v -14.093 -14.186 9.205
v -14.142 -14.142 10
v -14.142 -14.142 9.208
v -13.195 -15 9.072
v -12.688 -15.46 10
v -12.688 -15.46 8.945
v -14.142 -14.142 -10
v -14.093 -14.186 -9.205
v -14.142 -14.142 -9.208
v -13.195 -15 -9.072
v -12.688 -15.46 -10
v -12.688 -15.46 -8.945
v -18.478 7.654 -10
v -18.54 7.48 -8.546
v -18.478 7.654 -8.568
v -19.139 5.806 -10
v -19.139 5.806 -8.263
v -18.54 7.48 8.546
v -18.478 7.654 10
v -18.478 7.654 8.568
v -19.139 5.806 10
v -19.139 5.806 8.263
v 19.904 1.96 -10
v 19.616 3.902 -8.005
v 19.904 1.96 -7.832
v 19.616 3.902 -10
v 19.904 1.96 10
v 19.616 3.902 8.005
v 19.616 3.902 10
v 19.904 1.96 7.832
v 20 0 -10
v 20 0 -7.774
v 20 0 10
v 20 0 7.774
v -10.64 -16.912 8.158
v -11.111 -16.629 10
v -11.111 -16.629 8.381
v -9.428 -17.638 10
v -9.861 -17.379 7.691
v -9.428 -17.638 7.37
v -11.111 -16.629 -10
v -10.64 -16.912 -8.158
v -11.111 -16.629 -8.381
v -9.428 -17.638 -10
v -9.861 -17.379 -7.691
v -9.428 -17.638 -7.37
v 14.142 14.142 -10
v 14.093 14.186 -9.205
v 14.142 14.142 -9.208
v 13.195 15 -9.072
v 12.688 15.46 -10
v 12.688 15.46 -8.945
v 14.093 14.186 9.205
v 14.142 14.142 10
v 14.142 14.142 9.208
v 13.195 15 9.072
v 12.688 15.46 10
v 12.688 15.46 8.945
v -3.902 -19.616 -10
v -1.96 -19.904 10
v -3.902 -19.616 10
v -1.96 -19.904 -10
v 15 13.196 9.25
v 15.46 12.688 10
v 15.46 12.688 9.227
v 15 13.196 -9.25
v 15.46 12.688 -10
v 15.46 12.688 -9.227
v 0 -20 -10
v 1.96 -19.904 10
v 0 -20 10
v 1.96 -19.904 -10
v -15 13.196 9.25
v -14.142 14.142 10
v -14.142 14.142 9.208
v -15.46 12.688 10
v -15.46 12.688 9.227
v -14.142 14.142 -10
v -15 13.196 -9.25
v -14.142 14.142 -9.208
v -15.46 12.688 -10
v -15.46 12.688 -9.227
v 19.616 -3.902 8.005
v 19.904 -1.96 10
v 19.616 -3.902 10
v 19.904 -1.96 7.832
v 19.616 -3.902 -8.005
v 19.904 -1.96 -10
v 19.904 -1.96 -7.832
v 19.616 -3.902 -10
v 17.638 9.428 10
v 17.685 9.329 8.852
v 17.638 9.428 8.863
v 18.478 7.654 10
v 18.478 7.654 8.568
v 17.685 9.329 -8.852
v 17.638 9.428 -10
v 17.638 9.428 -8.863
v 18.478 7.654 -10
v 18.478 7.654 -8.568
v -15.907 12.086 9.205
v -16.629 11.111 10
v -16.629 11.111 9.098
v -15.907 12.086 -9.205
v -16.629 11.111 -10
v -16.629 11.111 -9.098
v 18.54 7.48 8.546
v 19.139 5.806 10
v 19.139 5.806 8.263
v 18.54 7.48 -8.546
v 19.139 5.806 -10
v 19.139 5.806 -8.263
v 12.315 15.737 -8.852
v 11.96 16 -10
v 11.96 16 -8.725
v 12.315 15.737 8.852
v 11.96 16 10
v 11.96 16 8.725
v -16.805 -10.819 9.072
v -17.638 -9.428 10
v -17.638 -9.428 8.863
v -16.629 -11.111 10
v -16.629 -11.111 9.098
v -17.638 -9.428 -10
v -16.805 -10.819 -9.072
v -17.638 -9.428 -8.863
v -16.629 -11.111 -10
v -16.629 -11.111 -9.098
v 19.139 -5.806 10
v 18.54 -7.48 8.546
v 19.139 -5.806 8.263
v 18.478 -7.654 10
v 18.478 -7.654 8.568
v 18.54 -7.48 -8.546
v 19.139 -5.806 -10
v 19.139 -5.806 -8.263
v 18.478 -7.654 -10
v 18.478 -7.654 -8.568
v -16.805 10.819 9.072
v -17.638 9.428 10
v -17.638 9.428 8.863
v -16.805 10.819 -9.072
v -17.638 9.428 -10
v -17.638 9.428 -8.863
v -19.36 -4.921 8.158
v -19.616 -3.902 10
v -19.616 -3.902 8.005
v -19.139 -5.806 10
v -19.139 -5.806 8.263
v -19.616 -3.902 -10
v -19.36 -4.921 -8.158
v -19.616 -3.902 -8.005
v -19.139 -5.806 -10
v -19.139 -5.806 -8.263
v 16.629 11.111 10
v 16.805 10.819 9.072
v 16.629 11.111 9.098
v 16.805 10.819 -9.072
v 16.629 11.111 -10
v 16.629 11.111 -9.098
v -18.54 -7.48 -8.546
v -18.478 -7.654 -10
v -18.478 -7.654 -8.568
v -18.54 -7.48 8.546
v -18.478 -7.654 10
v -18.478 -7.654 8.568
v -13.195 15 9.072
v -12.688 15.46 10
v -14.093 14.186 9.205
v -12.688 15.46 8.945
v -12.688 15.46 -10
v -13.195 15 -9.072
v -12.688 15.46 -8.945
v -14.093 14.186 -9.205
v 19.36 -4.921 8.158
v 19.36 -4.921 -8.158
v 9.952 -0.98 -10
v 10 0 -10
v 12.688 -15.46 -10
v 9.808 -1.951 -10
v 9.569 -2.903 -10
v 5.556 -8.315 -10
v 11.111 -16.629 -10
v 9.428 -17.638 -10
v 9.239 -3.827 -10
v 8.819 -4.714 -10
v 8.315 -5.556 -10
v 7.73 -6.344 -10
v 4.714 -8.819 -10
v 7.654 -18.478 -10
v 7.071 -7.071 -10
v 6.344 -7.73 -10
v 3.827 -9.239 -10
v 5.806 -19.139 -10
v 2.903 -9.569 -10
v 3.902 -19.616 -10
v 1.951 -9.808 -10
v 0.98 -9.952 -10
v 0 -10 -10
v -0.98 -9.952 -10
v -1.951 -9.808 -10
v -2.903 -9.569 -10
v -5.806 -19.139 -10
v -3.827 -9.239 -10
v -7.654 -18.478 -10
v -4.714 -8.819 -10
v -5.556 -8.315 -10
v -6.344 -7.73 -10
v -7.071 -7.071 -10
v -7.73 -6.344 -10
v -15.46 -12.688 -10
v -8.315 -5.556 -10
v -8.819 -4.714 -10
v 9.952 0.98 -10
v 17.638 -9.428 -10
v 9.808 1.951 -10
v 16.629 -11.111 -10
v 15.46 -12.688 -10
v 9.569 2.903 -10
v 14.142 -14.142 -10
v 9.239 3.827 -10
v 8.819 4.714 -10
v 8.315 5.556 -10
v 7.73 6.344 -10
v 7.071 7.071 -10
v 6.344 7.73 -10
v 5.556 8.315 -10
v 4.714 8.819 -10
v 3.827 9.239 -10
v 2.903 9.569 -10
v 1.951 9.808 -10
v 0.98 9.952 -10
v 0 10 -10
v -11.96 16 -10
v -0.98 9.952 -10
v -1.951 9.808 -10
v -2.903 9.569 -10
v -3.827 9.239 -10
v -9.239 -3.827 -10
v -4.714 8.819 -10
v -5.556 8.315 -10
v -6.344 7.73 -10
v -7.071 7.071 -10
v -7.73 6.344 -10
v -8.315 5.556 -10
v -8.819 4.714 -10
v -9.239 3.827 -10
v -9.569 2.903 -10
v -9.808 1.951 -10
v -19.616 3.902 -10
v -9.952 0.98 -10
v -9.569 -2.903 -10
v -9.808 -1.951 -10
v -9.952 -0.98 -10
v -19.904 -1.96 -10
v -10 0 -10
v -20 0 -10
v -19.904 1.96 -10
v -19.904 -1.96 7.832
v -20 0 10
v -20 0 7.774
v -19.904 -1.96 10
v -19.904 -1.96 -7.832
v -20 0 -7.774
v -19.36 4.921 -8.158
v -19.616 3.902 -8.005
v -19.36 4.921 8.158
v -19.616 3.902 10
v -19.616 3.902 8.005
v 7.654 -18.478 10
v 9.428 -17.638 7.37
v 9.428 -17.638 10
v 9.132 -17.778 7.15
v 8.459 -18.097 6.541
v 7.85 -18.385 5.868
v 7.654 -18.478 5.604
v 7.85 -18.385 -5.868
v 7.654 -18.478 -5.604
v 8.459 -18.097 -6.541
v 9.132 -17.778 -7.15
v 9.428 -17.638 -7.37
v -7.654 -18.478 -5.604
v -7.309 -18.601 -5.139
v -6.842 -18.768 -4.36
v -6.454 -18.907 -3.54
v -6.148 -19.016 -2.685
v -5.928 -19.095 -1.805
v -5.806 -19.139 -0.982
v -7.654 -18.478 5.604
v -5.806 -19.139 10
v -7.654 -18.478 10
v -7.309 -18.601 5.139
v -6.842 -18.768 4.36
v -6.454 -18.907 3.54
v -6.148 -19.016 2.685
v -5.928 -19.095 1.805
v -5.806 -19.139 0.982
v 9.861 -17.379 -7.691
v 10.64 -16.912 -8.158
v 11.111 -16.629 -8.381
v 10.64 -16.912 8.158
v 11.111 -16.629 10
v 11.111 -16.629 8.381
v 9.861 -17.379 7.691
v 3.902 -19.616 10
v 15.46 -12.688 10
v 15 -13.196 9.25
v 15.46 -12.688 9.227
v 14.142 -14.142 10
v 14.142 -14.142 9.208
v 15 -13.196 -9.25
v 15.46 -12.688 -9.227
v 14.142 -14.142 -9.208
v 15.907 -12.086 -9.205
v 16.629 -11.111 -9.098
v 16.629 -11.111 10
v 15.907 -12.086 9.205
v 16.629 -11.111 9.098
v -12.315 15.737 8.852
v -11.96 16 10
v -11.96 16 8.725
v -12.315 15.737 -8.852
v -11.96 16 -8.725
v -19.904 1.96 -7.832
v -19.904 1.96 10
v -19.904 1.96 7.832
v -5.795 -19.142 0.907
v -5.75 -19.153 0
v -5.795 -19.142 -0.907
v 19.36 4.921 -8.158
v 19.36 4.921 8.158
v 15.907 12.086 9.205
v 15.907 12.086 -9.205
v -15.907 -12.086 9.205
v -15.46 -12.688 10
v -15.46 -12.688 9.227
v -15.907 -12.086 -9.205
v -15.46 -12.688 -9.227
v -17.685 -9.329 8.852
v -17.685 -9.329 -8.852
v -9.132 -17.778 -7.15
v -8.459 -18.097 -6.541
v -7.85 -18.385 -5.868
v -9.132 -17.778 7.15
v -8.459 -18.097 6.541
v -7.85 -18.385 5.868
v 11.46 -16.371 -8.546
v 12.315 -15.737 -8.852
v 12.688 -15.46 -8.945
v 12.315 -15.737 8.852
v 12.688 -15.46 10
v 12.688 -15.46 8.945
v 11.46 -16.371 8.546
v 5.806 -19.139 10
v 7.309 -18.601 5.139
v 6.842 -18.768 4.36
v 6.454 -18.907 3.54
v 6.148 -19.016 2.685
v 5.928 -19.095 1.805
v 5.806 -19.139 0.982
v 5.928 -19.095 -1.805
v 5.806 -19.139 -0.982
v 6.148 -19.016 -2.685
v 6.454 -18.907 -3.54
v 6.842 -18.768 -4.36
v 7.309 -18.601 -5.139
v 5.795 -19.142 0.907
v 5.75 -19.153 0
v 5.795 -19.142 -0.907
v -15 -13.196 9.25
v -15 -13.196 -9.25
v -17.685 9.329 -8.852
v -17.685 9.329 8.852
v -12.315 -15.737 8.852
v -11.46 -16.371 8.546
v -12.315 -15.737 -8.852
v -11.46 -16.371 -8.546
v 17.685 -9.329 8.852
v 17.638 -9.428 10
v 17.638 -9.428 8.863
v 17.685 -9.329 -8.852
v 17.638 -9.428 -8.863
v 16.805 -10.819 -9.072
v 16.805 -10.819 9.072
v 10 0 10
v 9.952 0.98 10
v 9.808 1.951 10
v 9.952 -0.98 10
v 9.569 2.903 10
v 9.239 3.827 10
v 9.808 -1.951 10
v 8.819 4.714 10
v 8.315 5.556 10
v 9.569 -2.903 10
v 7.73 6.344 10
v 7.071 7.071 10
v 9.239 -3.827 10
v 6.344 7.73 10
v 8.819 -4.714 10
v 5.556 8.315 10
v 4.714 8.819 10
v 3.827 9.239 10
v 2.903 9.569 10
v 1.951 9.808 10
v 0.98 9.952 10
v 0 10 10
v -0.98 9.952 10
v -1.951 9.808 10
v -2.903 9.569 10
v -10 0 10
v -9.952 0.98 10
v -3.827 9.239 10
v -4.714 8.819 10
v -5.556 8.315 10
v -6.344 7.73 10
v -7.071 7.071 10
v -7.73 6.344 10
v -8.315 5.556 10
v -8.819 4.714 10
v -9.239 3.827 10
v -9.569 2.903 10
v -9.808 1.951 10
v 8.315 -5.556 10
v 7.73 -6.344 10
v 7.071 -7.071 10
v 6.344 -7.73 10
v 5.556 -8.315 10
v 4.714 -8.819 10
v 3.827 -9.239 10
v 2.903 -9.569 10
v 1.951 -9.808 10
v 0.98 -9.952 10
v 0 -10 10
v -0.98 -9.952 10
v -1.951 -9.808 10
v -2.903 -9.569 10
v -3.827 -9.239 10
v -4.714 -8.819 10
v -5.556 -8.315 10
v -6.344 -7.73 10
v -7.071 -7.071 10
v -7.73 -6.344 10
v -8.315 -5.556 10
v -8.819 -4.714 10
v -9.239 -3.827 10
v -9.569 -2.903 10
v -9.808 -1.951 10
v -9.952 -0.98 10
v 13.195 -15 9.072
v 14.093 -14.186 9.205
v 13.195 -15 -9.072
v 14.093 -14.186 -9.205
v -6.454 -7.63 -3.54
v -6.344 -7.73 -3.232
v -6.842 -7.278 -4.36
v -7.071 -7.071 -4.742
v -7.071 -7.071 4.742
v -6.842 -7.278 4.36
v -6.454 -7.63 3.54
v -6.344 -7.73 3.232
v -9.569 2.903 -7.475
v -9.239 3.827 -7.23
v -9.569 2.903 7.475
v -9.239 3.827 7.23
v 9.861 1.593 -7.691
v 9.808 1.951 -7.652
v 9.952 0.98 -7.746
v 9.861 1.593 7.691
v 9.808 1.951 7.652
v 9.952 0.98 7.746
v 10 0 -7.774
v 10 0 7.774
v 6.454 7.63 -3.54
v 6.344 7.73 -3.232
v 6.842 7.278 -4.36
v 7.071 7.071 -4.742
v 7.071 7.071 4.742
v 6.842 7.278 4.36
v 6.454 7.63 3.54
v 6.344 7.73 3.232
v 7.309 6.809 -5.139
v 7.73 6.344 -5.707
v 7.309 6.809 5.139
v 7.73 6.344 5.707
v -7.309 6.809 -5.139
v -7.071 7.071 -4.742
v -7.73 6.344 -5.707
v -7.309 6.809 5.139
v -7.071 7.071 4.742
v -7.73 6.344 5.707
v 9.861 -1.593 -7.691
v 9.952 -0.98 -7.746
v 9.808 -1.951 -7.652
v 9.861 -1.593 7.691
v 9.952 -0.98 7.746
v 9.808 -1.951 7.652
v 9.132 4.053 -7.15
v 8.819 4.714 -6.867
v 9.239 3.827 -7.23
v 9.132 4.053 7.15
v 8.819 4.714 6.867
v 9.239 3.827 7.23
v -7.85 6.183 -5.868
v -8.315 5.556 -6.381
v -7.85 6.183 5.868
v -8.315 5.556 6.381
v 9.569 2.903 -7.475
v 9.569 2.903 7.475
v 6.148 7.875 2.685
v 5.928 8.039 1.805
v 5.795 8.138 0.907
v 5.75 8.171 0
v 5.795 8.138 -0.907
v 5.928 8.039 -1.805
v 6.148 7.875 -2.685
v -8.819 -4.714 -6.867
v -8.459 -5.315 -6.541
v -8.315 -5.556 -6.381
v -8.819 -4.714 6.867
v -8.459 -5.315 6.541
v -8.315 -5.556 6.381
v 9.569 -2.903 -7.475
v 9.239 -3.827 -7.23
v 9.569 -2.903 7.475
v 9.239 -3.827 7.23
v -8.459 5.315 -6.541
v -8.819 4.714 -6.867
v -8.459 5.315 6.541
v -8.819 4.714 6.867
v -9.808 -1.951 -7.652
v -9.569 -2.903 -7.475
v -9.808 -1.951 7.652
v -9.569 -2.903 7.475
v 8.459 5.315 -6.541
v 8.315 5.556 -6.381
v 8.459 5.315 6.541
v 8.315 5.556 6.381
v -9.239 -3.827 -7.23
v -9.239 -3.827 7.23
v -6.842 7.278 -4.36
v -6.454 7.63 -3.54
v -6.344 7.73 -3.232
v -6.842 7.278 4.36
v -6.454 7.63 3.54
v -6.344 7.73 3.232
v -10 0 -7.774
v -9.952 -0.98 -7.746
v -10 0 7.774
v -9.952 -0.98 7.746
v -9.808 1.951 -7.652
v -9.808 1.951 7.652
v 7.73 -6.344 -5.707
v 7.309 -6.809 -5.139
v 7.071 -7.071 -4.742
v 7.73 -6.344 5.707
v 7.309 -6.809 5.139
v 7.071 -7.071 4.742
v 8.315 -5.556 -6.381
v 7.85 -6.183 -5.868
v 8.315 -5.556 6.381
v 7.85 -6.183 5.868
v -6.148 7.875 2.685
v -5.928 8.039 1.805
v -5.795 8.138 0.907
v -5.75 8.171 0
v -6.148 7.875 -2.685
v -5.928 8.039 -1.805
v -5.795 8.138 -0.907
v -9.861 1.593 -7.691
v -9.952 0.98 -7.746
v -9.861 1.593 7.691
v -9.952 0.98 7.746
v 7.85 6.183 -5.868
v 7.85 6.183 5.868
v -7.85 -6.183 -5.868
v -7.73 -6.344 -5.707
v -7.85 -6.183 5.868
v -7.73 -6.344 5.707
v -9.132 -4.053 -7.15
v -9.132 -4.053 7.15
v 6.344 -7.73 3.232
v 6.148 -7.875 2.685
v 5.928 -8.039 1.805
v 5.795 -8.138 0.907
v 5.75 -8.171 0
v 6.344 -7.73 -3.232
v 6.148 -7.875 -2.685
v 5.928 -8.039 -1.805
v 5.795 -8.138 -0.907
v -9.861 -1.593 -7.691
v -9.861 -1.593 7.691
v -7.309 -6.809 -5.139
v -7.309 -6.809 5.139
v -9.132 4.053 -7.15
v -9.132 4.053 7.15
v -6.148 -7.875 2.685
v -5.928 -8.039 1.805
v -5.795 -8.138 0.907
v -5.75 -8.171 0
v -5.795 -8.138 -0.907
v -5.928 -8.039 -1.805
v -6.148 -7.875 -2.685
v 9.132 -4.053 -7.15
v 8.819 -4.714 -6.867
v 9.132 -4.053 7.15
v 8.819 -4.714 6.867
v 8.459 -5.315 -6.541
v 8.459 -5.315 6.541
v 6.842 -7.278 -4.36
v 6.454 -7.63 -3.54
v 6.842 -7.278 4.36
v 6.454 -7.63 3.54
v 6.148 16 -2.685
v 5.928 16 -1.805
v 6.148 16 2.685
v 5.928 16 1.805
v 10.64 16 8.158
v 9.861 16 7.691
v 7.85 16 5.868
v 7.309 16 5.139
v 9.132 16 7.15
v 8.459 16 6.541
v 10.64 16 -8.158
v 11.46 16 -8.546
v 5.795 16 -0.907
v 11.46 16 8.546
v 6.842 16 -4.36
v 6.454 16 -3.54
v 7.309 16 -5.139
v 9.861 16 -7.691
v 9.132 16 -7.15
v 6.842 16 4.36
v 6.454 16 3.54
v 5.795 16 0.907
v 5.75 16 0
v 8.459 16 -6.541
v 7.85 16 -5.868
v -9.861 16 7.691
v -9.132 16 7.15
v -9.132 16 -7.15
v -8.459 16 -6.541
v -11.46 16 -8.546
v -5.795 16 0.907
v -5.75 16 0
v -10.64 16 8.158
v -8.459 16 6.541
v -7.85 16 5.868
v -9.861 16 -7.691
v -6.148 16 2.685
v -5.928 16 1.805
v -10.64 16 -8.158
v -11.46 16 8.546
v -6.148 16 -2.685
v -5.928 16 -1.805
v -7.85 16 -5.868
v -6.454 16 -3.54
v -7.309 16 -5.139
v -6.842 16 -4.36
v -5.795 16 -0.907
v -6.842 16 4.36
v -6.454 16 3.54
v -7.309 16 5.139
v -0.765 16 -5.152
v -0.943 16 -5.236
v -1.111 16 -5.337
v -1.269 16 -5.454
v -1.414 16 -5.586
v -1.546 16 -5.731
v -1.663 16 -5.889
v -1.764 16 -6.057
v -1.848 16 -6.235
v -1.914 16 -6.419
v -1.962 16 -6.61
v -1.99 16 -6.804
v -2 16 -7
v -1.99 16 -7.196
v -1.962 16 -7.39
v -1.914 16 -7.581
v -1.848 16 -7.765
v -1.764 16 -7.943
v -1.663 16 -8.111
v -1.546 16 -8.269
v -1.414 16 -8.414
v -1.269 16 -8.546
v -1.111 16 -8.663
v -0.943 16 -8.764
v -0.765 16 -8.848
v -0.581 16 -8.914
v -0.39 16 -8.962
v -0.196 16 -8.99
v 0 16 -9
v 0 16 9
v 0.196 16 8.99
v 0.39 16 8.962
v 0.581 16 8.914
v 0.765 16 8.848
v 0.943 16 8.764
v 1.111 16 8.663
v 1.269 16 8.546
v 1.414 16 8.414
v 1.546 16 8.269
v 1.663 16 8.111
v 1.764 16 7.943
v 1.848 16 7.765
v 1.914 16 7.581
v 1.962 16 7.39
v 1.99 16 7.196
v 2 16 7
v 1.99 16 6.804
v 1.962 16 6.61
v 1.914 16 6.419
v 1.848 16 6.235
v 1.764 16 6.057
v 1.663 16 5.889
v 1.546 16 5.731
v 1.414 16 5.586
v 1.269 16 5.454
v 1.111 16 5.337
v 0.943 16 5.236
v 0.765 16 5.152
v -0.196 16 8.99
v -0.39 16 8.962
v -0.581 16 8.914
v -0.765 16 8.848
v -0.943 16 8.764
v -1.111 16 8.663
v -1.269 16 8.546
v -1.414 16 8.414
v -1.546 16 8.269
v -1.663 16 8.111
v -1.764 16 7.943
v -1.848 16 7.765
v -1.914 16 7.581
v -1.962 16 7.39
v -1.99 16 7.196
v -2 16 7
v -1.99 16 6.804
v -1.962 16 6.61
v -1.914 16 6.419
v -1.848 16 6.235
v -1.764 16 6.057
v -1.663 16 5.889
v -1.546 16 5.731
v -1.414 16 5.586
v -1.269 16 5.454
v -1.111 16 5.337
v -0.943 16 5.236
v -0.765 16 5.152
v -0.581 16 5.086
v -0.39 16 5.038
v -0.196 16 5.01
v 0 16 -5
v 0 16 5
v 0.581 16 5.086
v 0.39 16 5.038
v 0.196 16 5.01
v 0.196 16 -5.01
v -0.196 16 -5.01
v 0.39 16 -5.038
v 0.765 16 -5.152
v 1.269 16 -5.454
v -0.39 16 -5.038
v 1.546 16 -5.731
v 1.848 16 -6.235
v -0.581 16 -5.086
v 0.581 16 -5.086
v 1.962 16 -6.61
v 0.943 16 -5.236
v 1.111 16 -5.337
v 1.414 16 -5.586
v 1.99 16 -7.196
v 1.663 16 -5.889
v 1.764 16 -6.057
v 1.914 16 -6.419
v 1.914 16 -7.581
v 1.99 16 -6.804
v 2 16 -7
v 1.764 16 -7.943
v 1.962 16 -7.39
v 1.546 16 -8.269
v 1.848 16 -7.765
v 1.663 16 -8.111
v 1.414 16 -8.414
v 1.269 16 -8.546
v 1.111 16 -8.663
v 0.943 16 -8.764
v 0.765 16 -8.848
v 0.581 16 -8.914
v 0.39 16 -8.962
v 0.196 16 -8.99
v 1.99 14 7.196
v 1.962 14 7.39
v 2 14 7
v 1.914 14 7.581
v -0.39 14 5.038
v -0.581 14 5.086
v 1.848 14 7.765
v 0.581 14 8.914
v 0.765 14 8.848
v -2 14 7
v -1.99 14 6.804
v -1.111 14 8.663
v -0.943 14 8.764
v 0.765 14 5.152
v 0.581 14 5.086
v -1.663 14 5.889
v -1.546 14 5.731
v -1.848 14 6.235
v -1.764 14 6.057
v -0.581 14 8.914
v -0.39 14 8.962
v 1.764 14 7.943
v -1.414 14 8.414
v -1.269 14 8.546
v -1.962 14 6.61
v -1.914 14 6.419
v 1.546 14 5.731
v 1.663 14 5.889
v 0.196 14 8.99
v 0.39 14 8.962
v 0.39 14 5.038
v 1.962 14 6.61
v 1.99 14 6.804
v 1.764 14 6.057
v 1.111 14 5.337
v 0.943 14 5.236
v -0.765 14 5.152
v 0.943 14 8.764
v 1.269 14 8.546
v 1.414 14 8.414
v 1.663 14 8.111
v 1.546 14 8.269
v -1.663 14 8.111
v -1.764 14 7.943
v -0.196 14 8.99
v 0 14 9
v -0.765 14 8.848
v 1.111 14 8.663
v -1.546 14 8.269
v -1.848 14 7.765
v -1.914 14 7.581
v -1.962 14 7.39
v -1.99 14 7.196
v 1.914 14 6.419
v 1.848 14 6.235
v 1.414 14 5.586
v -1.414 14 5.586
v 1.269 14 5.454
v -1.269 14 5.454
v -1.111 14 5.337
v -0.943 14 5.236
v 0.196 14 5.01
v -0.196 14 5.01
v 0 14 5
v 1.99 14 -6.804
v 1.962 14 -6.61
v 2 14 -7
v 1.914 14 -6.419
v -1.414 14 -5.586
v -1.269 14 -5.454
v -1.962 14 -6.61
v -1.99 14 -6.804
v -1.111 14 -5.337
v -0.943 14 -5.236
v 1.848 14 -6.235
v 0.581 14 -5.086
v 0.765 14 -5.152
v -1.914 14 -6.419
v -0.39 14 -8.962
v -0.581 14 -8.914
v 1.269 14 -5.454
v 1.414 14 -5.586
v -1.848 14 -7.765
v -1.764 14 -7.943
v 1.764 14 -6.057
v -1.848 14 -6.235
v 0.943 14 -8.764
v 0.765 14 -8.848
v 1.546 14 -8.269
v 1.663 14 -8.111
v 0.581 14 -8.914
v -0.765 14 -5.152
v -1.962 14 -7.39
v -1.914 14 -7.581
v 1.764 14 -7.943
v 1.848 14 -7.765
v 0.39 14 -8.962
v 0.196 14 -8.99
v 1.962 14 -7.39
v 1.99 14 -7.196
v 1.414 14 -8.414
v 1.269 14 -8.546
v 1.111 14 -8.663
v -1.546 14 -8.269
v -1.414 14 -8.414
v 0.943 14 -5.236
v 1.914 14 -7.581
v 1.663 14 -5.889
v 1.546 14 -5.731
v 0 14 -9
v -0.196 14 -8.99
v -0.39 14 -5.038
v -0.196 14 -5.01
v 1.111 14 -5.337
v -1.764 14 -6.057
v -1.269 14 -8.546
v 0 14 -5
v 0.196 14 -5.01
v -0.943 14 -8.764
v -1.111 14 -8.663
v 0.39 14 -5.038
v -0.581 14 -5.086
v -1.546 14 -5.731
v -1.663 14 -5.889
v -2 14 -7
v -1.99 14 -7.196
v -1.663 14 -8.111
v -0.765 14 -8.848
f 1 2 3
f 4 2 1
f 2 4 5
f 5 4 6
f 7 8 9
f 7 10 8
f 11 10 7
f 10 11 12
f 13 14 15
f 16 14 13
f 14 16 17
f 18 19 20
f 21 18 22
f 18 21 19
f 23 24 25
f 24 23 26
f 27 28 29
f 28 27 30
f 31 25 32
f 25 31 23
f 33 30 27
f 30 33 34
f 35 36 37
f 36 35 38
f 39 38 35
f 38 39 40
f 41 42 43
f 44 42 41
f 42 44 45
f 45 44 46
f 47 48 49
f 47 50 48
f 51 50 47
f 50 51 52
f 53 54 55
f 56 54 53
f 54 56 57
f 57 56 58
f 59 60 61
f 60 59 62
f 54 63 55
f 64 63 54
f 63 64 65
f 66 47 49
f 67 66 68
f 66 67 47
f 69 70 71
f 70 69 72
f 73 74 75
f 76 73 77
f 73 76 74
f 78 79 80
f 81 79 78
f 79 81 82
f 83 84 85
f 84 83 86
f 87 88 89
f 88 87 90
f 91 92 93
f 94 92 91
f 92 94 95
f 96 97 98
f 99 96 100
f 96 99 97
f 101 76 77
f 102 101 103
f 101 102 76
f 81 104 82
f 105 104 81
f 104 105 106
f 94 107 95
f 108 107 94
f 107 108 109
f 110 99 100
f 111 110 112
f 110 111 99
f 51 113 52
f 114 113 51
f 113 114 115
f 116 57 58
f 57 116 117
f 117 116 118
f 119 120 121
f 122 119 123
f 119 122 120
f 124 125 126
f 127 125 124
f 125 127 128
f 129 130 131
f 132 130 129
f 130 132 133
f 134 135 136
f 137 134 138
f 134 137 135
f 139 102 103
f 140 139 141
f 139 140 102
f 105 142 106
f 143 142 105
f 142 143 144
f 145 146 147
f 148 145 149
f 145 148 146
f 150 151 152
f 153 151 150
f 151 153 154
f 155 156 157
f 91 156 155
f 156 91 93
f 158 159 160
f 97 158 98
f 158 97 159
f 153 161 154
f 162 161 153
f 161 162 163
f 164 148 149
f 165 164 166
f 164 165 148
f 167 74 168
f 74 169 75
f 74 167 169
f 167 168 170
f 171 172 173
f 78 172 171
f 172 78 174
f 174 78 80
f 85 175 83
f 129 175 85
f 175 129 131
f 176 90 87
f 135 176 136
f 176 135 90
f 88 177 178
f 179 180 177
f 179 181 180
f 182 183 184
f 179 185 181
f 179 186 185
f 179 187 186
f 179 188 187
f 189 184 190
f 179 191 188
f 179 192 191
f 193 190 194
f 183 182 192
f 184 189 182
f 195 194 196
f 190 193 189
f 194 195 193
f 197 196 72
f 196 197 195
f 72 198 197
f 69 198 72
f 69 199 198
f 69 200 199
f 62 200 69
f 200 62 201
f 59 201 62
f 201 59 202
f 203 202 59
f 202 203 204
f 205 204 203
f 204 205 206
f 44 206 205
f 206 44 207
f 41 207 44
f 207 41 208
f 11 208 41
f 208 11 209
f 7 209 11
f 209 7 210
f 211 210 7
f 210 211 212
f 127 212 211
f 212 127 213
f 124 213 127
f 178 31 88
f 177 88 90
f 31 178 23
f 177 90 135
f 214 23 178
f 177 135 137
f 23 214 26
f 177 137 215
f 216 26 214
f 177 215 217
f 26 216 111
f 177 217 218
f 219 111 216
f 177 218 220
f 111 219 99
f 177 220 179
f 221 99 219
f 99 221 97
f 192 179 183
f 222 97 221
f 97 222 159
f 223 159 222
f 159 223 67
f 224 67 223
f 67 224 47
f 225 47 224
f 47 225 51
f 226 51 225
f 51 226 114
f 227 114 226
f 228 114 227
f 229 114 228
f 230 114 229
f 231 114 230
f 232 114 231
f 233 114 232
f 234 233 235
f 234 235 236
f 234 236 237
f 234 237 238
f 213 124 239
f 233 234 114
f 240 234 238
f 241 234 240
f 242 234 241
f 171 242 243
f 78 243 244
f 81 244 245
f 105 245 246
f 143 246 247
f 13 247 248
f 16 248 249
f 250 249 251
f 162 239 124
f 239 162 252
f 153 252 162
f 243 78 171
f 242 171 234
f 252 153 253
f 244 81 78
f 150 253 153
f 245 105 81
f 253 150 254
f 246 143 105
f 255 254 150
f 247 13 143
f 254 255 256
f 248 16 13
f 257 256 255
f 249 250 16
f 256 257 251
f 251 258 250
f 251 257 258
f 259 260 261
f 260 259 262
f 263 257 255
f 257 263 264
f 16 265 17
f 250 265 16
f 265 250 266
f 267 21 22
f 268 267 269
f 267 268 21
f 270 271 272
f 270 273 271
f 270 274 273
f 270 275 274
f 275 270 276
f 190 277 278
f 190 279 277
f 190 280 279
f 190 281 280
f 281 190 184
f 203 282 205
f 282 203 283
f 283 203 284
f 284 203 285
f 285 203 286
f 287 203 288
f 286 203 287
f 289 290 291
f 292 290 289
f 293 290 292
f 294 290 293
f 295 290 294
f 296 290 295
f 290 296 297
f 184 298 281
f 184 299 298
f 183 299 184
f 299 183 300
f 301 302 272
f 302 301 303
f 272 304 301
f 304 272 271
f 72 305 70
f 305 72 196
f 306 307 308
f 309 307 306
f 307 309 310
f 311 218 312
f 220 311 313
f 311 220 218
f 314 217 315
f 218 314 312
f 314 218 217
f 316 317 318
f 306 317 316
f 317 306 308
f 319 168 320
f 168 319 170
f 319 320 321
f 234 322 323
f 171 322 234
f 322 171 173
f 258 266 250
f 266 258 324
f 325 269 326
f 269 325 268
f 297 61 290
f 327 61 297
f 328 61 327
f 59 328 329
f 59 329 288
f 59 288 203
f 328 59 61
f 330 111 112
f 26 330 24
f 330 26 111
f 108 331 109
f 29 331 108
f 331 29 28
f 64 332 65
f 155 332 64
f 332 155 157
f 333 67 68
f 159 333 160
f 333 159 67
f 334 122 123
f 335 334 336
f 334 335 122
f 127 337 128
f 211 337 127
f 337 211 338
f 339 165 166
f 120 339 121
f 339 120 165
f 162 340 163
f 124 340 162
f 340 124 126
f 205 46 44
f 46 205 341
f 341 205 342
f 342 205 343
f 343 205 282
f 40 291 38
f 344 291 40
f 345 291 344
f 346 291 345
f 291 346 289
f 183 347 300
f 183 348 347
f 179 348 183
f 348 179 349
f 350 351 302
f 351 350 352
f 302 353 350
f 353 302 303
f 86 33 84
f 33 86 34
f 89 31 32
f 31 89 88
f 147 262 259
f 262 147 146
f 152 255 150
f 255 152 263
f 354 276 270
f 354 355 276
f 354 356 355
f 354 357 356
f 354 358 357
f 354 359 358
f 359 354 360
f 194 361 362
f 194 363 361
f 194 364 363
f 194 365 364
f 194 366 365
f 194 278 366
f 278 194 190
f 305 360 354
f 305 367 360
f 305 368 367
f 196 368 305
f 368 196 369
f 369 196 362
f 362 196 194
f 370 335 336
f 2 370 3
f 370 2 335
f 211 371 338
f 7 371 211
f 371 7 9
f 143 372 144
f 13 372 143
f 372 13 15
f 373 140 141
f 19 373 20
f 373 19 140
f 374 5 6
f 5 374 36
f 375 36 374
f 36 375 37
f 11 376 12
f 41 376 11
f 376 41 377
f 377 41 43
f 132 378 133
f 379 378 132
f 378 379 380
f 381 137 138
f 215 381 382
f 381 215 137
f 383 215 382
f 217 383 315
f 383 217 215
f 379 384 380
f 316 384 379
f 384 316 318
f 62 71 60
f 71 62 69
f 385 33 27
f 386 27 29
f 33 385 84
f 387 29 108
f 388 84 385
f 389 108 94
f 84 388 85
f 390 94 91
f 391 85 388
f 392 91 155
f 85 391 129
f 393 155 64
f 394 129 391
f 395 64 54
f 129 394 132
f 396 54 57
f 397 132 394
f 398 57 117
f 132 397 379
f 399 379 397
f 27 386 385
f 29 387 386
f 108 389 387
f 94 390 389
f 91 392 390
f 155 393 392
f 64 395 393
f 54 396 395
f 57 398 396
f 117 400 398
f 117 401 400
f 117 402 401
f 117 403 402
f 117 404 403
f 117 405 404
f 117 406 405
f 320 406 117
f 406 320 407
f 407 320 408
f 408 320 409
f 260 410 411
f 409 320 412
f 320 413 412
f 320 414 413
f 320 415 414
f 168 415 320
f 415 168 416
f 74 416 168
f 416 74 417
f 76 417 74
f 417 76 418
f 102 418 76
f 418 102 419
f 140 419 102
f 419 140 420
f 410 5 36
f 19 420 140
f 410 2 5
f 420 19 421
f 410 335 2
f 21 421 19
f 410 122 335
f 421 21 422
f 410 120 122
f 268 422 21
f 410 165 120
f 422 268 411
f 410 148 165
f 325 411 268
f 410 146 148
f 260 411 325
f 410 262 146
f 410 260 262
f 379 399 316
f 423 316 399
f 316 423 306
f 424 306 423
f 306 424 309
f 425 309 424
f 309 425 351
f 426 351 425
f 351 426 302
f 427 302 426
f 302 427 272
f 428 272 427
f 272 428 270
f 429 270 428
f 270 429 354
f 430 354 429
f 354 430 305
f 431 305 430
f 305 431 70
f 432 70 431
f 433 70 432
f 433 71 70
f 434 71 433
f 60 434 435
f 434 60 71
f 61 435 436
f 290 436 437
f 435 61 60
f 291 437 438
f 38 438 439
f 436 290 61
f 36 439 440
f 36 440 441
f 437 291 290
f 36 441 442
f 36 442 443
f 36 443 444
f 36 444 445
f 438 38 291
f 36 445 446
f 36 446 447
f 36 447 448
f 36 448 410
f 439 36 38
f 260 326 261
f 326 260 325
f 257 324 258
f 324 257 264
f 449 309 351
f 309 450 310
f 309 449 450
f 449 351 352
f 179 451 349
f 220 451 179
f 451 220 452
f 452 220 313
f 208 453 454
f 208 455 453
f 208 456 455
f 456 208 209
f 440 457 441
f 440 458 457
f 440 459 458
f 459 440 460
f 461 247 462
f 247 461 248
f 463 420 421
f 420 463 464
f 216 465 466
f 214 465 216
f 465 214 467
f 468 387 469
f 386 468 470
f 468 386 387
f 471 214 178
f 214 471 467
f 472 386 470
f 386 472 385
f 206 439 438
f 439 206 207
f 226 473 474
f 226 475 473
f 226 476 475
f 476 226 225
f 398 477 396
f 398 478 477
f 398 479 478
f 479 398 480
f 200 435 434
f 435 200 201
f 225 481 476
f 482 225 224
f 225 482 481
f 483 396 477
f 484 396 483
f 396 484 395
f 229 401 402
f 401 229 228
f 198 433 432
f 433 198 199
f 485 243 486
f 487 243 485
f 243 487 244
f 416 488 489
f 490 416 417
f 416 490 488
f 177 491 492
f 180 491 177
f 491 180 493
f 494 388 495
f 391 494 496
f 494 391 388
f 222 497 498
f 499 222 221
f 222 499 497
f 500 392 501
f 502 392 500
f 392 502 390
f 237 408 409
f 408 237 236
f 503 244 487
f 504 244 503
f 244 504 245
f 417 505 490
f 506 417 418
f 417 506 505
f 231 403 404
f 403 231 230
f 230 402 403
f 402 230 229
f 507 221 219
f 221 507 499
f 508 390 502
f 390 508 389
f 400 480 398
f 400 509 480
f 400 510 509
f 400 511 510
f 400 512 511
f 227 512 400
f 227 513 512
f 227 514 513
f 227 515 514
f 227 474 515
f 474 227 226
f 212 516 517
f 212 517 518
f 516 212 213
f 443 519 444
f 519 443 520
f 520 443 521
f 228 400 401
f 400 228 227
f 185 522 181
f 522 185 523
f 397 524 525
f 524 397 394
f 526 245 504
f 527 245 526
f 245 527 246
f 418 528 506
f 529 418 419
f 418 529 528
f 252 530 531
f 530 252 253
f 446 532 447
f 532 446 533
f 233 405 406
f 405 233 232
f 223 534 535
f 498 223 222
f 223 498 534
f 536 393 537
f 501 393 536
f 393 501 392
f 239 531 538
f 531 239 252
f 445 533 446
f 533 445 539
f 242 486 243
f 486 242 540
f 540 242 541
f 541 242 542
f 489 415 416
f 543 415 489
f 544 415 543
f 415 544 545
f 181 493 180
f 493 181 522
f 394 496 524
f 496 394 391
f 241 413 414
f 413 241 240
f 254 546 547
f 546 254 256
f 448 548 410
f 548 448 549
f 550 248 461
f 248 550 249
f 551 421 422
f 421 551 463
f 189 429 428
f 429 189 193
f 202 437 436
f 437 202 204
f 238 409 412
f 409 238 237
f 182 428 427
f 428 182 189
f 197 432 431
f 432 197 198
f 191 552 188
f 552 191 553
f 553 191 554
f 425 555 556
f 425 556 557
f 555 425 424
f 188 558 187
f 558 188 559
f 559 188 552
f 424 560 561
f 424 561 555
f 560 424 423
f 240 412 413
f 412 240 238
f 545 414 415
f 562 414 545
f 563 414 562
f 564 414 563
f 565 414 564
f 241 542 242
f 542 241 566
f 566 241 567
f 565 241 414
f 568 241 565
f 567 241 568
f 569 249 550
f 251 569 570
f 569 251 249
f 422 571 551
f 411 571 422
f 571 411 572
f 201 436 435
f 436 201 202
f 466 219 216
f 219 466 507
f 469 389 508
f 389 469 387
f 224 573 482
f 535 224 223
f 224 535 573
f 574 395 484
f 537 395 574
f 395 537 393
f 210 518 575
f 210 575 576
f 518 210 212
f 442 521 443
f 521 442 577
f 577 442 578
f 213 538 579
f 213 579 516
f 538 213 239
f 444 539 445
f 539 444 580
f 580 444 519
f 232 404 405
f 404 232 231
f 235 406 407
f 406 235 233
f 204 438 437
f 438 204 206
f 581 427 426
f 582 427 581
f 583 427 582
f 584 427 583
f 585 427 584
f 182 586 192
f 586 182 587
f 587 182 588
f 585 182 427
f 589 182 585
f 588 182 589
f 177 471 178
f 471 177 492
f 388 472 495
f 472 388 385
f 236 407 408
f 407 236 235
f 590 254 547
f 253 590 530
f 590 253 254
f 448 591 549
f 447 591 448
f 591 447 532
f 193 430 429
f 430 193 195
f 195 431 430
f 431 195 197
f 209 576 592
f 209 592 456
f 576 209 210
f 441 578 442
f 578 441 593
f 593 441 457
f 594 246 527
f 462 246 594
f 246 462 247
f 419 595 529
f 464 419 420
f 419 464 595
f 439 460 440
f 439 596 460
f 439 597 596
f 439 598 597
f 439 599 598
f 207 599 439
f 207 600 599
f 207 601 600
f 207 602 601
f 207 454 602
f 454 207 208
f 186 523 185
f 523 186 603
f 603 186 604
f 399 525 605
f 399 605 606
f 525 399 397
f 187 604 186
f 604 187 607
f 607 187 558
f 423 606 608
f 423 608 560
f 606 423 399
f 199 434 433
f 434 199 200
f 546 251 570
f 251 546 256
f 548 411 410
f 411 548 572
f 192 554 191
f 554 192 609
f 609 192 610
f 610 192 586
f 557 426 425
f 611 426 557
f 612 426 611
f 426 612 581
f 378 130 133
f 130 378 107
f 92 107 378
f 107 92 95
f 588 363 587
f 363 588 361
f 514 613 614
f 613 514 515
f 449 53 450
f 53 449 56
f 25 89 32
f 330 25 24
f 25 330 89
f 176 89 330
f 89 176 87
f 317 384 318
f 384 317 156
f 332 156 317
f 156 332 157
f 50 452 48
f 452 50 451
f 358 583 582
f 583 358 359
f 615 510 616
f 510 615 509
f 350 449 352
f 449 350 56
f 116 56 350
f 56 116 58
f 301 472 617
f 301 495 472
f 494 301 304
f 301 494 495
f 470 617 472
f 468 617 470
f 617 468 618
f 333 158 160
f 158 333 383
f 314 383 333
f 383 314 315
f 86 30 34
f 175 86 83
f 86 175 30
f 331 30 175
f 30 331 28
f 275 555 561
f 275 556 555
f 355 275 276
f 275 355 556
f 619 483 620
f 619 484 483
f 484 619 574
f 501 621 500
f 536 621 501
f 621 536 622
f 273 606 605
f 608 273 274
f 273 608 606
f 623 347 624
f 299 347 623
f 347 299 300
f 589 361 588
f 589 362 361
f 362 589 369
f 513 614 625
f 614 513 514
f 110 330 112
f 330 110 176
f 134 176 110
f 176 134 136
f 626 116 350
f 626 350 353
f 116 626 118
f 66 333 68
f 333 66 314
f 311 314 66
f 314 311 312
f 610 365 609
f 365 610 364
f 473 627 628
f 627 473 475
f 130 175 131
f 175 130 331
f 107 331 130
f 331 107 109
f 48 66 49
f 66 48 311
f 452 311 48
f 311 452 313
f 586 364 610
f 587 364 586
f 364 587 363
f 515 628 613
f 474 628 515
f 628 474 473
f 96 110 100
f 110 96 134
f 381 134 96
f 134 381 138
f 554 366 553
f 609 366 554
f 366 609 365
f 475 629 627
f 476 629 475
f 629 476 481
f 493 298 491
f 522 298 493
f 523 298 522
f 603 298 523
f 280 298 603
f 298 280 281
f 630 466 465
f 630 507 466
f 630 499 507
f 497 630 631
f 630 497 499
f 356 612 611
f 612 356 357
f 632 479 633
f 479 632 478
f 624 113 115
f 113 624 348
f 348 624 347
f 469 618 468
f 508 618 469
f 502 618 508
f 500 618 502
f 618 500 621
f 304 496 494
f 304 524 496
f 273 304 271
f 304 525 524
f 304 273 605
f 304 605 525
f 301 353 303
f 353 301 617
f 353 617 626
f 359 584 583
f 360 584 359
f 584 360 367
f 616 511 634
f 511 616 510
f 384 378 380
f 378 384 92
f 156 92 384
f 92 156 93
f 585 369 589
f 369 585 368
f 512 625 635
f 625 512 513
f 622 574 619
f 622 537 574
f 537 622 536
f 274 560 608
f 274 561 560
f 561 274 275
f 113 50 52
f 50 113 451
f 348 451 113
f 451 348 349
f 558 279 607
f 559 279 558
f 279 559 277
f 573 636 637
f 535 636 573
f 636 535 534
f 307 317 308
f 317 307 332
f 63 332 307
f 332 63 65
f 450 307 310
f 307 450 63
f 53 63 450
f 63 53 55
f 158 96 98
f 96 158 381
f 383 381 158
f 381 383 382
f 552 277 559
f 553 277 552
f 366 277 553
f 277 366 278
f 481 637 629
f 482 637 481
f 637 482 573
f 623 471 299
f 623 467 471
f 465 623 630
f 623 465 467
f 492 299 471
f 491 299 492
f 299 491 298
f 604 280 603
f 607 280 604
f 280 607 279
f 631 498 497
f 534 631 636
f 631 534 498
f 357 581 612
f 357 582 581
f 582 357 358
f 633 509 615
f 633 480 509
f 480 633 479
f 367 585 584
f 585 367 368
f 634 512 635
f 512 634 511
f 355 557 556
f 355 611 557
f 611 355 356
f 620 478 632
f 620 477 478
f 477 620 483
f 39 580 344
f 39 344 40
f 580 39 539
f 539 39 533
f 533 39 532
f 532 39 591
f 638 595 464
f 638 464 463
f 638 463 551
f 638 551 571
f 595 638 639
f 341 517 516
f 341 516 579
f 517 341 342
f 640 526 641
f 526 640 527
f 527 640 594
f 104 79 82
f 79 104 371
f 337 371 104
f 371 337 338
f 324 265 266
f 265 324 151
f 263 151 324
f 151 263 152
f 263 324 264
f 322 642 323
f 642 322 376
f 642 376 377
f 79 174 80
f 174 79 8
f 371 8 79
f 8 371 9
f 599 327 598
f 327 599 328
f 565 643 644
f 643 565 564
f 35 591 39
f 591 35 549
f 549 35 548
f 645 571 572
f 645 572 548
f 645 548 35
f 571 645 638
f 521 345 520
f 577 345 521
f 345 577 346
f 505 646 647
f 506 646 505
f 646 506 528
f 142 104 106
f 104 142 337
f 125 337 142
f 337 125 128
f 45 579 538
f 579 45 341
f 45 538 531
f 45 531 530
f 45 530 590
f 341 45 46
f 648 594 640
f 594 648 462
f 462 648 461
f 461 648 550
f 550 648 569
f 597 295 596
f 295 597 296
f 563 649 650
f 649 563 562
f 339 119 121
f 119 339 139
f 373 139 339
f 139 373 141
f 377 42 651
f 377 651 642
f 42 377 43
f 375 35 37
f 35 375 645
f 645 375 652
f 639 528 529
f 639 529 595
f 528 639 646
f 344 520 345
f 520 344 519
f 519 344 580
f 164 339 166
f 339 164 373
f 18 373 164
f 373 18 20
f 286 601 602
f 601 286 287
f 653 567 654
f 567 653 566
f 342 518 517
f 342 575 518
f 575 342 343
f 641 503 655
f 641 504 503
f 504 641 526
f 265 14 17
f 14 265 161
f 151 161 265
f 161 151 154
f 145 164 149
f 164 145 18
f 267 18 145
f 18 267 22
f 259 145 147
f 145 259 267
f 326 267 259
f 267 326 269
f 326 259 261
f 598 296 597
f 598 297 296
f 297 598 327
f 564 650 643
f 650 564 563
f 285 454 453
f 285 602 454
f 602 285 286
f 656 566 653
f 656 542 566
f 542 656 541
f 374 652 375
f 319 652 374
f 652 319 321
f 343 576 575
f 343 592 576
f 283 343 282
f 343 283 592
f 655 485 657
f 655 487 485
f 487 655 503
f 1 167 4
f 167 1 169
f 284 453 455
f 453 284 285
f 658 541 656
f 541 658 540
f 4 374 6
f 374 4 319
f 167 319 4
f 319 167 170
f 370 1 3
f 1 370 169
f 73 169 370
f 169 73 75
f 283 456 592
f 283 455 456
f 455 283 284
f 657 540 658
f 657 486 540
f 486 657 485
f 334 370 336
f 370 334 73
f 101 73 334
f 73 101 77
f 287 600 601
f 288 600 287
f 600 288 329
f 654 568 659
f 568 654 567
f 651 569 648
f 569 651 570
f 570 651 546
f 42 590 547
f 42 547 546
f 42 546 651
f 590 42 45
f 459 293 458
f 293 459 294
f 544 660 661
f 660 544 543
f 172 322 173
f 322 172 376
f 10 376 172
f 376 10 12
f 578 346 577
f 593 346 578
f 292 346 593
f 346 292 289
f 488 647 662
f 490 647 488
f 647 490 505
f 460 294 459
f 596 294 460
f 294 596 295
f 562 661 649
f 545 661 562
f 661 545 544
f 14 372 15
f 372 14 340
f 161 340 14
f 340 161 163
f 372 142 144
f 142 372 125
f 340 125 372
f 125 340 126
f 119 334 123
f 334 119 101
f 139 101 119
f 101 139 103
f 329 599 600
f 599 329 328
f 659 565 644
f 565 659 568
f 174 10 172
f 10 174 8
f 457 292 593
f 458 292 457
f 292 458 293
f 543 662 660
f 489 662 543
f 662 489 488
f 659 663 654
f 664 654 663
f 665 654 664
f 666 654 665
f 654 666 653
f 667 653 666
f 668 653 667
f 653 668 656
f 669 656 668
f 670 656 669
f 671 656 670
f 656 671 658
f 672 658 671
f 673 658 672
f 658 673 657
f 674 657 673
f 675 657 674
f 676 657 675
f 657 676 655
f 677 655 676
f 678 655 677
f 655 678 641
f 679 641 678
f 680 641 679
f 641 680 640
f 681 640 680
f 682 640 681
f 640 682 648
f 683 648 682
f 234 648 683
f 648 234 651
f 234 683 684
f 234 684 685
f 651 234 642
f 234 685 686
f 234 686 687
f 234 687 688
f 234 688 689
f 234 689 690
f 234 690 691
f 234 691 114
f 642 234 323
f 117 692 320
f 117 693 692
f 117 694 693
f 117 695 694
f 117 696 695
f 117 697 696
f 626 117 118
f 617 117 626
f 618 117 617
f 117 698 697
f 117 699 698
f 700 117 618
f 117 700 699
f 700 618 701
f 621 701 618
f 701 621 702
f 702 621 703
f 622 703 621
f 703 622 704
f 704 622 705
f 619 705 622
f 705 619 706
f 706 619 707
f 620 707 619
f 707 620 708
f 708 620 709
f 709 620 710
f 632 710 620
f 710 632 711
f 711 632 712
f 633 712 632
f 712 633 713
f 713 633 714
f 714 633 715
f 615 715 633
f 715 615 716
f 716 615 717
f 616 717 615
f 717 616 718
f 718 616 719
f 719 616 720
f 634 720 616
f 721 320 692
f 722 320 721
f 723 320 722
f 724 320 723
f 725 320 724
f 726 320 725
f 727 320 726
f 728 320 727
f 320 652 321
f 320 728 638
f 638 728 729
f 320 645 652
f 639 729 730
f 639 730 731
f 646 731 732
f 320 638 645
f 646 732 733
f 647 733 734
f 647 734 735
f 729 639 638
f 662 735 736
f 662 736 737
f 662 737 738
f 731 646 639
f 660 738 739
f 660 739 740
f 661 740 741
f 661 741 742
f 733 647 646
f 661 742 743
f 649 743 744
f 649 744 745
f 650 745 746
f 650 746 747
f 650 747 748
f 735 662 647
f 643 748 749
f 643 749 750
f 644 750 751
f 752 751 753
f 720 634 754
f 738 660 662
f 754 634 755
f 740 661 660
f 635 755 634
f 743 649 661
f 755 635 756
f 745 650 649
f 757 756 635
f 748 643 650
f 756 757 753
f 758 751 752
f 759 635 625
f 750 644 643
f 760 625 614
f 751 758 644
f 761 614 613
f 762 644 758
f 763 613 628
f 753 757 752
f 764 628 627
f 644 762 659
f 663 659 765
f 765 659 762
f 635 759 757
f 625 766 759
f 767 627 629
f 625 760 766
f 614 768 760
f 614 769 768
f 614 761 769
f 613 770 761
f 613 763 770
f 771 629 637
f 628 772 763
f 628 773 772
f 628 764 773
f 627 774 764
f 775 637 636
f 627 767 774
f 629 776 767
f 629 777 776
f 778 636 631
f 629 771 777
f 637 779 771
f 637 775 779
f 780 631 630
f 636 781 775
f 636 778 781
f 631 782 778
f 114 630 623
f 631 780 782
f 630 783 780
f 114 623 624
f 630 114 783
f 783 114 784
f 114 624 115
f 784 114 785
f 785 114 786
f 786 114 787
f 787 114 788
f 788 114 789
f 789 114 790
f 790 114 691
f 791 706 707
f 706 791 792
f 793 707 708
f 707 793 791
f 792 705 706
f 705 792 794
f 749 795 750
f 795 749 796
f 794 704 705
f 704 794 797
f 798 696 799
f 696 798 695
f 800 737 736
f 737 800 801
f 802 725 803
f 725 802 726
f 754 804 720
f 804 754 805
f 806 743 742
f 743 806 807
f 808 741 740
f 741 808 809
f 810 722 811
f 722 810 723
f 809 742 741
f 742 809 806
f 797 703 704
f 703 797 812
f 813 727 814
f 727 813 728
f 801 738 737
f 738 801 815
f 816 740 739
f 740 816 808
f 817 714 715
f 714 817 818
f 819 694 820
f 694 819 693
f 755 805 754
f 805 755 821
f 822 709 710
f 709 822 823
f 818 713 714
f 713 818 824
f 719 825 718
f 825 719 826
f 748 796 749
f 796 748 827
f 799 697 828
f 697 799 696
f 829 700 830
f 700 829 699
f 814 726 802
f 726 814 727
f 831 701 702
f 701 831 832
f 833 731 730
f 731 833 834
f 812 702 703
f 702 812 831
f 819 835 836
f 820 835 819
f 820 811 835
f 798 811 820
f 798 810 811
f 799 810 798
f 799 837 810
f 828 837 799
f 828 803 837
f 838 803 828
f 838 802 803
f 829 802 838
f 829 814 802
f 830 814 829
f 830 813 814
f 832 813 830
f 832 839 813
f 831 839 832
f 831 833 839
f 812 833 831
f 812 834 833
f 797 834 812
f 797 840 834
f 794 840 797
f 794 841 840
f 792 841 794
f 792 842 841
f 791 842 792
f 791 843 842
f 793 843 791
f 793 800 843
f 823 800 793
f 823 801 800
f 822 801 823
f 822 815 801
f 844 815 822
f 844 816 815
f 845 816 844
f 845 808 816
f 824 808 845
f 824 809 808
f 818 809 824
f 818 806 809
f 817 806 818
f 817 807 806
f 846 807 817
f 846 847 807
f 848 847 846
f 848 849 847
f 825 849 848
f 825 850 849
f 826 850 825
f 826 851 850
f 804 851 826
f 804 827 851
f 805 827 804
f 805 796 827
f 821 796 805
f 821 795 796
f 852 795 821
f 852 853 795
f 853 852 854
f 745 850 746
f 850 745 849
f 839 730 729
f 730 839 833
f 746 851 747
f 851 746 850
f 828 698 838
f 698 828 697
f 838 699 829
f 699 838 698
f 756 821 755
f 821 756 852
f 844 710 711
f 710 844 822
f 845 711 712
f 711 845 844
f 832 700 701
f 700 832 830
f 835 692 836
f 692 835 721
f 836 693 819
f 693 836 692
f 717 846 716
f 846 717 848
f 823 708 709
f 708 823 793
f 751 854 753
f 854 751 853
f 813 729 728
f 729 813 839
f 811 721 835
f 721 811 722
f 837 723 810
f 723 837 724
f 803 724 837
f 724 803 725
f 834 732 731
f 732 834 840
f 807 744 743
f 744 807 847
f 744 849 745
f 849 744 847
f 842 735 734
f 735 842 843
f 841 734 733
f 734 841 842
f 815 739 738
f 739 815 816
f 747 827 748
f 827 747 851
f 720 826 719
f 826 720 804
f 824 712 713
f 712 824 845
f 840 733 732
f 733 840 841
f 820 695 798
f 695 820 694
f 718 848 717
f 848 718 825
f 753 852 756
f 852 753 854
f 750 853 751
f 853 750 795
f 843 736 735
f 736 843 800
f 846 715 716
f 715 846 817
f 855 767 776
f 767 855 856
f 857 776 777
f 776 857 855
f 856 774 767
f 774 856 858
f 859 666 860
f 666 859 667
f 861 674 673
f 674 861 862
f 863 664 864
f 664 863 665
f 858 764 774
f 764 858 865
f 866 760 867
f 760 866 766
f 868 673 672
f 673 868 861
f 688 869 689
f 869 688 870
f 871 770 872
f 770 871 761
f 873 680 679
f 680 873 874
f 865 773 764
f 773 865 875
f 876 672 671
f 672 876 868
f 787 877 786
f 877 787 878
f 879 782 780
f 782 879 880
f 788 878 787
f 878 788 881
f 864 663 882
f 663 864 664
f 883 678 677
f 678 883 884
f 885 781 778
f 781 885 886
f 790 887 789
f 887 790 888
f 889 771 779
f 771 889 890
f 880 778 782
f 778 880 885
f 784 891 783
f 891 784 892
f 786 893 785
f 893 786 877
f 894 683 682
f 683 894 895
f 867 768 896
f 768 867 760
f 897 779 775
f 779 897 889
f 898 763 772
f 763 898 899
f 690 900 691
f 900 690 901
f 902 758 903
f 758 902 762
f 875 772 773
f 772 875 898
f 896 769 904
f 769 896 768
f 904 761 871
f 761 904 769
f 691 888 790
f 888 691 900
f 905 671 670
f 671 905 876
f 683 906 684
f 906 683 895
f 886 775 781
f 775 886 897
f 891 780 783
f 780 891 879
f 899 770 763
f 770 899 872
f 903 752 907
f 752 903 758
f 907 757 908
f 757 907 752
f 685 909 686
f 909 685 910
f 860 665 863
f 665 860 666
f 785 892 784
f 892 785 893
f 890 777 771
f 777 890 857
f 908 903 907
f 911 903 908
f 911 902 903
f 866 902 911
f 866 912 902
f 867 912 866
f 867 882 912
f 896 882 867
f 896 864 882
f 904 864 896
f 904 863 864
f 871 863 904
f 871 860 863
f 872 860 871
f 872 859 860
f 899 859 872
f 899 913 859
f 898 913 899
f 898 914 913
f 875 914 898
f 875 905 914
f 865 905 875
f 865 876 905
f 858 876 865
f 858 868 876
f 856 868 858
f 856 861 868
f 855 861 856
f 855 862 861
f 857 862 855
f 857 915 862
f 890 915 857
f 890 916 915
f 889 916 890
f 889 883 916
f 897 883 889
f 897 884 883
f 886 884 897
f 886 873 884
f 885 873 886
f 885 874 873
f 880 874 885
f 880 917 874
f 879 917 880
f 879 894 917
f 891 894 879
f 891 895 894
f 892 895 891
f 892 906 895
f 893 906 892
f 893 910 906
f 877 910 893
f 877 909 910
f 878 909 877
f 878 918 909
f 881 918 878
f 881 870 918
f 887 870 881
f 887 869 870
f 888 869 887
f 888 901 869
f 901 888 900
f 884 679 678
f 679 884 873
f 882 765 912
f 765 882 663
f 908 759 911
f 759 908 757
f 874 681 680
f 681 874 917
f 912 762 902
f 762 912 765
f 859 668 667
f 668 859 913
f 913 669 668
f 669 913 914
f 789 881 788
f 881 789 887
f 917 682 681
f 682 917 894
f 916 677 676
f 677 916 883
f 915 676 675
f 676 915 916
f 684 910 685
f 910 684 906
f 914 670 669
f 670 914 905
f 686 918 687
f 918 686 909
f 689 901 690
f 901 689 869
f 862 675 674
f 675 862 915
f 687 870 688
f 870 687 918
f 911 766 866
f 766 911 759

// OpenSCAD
// COBRA Vertebra - T10 V16
// Height: 20.0mm, OD: 40.0mm

$fn = 64;

difference() {
    // Outer cylinder
    cylinder(h=20.0, d=40.0, center=true);
    
    // Inner channel
    cylinder(h=22.0, d=20.0, center=true);

    // Battery cavity 1
    rotate([0, 0, 0])
    translate([15.0, 0, 0])
    rotate([90, 0, 0])
    cylinder(h=74.0, d=18.5, center=true);

    // Battery cavity 2
    rotate([0, 0, 180])
    translate([15.0, 0, 0])
    rotate([90, 0, 0])
    cylinder(h=74.0, d=18.5, center=true);

    // Solar panel cavity
    translate([0, 18.0, 0])
    cube([50, 4, 30], center=true);

    // Pivot holes
    translate([0, 20.0, 7.0])
    rotate([90, 0, 0])
    cylinder(h=12.0, d=4, center=true);
    
    translate([0, 20.0, -7.0])
    rotate([90, 0, 0])
    cylinder(h=12.0, d=4, center=true);
}
